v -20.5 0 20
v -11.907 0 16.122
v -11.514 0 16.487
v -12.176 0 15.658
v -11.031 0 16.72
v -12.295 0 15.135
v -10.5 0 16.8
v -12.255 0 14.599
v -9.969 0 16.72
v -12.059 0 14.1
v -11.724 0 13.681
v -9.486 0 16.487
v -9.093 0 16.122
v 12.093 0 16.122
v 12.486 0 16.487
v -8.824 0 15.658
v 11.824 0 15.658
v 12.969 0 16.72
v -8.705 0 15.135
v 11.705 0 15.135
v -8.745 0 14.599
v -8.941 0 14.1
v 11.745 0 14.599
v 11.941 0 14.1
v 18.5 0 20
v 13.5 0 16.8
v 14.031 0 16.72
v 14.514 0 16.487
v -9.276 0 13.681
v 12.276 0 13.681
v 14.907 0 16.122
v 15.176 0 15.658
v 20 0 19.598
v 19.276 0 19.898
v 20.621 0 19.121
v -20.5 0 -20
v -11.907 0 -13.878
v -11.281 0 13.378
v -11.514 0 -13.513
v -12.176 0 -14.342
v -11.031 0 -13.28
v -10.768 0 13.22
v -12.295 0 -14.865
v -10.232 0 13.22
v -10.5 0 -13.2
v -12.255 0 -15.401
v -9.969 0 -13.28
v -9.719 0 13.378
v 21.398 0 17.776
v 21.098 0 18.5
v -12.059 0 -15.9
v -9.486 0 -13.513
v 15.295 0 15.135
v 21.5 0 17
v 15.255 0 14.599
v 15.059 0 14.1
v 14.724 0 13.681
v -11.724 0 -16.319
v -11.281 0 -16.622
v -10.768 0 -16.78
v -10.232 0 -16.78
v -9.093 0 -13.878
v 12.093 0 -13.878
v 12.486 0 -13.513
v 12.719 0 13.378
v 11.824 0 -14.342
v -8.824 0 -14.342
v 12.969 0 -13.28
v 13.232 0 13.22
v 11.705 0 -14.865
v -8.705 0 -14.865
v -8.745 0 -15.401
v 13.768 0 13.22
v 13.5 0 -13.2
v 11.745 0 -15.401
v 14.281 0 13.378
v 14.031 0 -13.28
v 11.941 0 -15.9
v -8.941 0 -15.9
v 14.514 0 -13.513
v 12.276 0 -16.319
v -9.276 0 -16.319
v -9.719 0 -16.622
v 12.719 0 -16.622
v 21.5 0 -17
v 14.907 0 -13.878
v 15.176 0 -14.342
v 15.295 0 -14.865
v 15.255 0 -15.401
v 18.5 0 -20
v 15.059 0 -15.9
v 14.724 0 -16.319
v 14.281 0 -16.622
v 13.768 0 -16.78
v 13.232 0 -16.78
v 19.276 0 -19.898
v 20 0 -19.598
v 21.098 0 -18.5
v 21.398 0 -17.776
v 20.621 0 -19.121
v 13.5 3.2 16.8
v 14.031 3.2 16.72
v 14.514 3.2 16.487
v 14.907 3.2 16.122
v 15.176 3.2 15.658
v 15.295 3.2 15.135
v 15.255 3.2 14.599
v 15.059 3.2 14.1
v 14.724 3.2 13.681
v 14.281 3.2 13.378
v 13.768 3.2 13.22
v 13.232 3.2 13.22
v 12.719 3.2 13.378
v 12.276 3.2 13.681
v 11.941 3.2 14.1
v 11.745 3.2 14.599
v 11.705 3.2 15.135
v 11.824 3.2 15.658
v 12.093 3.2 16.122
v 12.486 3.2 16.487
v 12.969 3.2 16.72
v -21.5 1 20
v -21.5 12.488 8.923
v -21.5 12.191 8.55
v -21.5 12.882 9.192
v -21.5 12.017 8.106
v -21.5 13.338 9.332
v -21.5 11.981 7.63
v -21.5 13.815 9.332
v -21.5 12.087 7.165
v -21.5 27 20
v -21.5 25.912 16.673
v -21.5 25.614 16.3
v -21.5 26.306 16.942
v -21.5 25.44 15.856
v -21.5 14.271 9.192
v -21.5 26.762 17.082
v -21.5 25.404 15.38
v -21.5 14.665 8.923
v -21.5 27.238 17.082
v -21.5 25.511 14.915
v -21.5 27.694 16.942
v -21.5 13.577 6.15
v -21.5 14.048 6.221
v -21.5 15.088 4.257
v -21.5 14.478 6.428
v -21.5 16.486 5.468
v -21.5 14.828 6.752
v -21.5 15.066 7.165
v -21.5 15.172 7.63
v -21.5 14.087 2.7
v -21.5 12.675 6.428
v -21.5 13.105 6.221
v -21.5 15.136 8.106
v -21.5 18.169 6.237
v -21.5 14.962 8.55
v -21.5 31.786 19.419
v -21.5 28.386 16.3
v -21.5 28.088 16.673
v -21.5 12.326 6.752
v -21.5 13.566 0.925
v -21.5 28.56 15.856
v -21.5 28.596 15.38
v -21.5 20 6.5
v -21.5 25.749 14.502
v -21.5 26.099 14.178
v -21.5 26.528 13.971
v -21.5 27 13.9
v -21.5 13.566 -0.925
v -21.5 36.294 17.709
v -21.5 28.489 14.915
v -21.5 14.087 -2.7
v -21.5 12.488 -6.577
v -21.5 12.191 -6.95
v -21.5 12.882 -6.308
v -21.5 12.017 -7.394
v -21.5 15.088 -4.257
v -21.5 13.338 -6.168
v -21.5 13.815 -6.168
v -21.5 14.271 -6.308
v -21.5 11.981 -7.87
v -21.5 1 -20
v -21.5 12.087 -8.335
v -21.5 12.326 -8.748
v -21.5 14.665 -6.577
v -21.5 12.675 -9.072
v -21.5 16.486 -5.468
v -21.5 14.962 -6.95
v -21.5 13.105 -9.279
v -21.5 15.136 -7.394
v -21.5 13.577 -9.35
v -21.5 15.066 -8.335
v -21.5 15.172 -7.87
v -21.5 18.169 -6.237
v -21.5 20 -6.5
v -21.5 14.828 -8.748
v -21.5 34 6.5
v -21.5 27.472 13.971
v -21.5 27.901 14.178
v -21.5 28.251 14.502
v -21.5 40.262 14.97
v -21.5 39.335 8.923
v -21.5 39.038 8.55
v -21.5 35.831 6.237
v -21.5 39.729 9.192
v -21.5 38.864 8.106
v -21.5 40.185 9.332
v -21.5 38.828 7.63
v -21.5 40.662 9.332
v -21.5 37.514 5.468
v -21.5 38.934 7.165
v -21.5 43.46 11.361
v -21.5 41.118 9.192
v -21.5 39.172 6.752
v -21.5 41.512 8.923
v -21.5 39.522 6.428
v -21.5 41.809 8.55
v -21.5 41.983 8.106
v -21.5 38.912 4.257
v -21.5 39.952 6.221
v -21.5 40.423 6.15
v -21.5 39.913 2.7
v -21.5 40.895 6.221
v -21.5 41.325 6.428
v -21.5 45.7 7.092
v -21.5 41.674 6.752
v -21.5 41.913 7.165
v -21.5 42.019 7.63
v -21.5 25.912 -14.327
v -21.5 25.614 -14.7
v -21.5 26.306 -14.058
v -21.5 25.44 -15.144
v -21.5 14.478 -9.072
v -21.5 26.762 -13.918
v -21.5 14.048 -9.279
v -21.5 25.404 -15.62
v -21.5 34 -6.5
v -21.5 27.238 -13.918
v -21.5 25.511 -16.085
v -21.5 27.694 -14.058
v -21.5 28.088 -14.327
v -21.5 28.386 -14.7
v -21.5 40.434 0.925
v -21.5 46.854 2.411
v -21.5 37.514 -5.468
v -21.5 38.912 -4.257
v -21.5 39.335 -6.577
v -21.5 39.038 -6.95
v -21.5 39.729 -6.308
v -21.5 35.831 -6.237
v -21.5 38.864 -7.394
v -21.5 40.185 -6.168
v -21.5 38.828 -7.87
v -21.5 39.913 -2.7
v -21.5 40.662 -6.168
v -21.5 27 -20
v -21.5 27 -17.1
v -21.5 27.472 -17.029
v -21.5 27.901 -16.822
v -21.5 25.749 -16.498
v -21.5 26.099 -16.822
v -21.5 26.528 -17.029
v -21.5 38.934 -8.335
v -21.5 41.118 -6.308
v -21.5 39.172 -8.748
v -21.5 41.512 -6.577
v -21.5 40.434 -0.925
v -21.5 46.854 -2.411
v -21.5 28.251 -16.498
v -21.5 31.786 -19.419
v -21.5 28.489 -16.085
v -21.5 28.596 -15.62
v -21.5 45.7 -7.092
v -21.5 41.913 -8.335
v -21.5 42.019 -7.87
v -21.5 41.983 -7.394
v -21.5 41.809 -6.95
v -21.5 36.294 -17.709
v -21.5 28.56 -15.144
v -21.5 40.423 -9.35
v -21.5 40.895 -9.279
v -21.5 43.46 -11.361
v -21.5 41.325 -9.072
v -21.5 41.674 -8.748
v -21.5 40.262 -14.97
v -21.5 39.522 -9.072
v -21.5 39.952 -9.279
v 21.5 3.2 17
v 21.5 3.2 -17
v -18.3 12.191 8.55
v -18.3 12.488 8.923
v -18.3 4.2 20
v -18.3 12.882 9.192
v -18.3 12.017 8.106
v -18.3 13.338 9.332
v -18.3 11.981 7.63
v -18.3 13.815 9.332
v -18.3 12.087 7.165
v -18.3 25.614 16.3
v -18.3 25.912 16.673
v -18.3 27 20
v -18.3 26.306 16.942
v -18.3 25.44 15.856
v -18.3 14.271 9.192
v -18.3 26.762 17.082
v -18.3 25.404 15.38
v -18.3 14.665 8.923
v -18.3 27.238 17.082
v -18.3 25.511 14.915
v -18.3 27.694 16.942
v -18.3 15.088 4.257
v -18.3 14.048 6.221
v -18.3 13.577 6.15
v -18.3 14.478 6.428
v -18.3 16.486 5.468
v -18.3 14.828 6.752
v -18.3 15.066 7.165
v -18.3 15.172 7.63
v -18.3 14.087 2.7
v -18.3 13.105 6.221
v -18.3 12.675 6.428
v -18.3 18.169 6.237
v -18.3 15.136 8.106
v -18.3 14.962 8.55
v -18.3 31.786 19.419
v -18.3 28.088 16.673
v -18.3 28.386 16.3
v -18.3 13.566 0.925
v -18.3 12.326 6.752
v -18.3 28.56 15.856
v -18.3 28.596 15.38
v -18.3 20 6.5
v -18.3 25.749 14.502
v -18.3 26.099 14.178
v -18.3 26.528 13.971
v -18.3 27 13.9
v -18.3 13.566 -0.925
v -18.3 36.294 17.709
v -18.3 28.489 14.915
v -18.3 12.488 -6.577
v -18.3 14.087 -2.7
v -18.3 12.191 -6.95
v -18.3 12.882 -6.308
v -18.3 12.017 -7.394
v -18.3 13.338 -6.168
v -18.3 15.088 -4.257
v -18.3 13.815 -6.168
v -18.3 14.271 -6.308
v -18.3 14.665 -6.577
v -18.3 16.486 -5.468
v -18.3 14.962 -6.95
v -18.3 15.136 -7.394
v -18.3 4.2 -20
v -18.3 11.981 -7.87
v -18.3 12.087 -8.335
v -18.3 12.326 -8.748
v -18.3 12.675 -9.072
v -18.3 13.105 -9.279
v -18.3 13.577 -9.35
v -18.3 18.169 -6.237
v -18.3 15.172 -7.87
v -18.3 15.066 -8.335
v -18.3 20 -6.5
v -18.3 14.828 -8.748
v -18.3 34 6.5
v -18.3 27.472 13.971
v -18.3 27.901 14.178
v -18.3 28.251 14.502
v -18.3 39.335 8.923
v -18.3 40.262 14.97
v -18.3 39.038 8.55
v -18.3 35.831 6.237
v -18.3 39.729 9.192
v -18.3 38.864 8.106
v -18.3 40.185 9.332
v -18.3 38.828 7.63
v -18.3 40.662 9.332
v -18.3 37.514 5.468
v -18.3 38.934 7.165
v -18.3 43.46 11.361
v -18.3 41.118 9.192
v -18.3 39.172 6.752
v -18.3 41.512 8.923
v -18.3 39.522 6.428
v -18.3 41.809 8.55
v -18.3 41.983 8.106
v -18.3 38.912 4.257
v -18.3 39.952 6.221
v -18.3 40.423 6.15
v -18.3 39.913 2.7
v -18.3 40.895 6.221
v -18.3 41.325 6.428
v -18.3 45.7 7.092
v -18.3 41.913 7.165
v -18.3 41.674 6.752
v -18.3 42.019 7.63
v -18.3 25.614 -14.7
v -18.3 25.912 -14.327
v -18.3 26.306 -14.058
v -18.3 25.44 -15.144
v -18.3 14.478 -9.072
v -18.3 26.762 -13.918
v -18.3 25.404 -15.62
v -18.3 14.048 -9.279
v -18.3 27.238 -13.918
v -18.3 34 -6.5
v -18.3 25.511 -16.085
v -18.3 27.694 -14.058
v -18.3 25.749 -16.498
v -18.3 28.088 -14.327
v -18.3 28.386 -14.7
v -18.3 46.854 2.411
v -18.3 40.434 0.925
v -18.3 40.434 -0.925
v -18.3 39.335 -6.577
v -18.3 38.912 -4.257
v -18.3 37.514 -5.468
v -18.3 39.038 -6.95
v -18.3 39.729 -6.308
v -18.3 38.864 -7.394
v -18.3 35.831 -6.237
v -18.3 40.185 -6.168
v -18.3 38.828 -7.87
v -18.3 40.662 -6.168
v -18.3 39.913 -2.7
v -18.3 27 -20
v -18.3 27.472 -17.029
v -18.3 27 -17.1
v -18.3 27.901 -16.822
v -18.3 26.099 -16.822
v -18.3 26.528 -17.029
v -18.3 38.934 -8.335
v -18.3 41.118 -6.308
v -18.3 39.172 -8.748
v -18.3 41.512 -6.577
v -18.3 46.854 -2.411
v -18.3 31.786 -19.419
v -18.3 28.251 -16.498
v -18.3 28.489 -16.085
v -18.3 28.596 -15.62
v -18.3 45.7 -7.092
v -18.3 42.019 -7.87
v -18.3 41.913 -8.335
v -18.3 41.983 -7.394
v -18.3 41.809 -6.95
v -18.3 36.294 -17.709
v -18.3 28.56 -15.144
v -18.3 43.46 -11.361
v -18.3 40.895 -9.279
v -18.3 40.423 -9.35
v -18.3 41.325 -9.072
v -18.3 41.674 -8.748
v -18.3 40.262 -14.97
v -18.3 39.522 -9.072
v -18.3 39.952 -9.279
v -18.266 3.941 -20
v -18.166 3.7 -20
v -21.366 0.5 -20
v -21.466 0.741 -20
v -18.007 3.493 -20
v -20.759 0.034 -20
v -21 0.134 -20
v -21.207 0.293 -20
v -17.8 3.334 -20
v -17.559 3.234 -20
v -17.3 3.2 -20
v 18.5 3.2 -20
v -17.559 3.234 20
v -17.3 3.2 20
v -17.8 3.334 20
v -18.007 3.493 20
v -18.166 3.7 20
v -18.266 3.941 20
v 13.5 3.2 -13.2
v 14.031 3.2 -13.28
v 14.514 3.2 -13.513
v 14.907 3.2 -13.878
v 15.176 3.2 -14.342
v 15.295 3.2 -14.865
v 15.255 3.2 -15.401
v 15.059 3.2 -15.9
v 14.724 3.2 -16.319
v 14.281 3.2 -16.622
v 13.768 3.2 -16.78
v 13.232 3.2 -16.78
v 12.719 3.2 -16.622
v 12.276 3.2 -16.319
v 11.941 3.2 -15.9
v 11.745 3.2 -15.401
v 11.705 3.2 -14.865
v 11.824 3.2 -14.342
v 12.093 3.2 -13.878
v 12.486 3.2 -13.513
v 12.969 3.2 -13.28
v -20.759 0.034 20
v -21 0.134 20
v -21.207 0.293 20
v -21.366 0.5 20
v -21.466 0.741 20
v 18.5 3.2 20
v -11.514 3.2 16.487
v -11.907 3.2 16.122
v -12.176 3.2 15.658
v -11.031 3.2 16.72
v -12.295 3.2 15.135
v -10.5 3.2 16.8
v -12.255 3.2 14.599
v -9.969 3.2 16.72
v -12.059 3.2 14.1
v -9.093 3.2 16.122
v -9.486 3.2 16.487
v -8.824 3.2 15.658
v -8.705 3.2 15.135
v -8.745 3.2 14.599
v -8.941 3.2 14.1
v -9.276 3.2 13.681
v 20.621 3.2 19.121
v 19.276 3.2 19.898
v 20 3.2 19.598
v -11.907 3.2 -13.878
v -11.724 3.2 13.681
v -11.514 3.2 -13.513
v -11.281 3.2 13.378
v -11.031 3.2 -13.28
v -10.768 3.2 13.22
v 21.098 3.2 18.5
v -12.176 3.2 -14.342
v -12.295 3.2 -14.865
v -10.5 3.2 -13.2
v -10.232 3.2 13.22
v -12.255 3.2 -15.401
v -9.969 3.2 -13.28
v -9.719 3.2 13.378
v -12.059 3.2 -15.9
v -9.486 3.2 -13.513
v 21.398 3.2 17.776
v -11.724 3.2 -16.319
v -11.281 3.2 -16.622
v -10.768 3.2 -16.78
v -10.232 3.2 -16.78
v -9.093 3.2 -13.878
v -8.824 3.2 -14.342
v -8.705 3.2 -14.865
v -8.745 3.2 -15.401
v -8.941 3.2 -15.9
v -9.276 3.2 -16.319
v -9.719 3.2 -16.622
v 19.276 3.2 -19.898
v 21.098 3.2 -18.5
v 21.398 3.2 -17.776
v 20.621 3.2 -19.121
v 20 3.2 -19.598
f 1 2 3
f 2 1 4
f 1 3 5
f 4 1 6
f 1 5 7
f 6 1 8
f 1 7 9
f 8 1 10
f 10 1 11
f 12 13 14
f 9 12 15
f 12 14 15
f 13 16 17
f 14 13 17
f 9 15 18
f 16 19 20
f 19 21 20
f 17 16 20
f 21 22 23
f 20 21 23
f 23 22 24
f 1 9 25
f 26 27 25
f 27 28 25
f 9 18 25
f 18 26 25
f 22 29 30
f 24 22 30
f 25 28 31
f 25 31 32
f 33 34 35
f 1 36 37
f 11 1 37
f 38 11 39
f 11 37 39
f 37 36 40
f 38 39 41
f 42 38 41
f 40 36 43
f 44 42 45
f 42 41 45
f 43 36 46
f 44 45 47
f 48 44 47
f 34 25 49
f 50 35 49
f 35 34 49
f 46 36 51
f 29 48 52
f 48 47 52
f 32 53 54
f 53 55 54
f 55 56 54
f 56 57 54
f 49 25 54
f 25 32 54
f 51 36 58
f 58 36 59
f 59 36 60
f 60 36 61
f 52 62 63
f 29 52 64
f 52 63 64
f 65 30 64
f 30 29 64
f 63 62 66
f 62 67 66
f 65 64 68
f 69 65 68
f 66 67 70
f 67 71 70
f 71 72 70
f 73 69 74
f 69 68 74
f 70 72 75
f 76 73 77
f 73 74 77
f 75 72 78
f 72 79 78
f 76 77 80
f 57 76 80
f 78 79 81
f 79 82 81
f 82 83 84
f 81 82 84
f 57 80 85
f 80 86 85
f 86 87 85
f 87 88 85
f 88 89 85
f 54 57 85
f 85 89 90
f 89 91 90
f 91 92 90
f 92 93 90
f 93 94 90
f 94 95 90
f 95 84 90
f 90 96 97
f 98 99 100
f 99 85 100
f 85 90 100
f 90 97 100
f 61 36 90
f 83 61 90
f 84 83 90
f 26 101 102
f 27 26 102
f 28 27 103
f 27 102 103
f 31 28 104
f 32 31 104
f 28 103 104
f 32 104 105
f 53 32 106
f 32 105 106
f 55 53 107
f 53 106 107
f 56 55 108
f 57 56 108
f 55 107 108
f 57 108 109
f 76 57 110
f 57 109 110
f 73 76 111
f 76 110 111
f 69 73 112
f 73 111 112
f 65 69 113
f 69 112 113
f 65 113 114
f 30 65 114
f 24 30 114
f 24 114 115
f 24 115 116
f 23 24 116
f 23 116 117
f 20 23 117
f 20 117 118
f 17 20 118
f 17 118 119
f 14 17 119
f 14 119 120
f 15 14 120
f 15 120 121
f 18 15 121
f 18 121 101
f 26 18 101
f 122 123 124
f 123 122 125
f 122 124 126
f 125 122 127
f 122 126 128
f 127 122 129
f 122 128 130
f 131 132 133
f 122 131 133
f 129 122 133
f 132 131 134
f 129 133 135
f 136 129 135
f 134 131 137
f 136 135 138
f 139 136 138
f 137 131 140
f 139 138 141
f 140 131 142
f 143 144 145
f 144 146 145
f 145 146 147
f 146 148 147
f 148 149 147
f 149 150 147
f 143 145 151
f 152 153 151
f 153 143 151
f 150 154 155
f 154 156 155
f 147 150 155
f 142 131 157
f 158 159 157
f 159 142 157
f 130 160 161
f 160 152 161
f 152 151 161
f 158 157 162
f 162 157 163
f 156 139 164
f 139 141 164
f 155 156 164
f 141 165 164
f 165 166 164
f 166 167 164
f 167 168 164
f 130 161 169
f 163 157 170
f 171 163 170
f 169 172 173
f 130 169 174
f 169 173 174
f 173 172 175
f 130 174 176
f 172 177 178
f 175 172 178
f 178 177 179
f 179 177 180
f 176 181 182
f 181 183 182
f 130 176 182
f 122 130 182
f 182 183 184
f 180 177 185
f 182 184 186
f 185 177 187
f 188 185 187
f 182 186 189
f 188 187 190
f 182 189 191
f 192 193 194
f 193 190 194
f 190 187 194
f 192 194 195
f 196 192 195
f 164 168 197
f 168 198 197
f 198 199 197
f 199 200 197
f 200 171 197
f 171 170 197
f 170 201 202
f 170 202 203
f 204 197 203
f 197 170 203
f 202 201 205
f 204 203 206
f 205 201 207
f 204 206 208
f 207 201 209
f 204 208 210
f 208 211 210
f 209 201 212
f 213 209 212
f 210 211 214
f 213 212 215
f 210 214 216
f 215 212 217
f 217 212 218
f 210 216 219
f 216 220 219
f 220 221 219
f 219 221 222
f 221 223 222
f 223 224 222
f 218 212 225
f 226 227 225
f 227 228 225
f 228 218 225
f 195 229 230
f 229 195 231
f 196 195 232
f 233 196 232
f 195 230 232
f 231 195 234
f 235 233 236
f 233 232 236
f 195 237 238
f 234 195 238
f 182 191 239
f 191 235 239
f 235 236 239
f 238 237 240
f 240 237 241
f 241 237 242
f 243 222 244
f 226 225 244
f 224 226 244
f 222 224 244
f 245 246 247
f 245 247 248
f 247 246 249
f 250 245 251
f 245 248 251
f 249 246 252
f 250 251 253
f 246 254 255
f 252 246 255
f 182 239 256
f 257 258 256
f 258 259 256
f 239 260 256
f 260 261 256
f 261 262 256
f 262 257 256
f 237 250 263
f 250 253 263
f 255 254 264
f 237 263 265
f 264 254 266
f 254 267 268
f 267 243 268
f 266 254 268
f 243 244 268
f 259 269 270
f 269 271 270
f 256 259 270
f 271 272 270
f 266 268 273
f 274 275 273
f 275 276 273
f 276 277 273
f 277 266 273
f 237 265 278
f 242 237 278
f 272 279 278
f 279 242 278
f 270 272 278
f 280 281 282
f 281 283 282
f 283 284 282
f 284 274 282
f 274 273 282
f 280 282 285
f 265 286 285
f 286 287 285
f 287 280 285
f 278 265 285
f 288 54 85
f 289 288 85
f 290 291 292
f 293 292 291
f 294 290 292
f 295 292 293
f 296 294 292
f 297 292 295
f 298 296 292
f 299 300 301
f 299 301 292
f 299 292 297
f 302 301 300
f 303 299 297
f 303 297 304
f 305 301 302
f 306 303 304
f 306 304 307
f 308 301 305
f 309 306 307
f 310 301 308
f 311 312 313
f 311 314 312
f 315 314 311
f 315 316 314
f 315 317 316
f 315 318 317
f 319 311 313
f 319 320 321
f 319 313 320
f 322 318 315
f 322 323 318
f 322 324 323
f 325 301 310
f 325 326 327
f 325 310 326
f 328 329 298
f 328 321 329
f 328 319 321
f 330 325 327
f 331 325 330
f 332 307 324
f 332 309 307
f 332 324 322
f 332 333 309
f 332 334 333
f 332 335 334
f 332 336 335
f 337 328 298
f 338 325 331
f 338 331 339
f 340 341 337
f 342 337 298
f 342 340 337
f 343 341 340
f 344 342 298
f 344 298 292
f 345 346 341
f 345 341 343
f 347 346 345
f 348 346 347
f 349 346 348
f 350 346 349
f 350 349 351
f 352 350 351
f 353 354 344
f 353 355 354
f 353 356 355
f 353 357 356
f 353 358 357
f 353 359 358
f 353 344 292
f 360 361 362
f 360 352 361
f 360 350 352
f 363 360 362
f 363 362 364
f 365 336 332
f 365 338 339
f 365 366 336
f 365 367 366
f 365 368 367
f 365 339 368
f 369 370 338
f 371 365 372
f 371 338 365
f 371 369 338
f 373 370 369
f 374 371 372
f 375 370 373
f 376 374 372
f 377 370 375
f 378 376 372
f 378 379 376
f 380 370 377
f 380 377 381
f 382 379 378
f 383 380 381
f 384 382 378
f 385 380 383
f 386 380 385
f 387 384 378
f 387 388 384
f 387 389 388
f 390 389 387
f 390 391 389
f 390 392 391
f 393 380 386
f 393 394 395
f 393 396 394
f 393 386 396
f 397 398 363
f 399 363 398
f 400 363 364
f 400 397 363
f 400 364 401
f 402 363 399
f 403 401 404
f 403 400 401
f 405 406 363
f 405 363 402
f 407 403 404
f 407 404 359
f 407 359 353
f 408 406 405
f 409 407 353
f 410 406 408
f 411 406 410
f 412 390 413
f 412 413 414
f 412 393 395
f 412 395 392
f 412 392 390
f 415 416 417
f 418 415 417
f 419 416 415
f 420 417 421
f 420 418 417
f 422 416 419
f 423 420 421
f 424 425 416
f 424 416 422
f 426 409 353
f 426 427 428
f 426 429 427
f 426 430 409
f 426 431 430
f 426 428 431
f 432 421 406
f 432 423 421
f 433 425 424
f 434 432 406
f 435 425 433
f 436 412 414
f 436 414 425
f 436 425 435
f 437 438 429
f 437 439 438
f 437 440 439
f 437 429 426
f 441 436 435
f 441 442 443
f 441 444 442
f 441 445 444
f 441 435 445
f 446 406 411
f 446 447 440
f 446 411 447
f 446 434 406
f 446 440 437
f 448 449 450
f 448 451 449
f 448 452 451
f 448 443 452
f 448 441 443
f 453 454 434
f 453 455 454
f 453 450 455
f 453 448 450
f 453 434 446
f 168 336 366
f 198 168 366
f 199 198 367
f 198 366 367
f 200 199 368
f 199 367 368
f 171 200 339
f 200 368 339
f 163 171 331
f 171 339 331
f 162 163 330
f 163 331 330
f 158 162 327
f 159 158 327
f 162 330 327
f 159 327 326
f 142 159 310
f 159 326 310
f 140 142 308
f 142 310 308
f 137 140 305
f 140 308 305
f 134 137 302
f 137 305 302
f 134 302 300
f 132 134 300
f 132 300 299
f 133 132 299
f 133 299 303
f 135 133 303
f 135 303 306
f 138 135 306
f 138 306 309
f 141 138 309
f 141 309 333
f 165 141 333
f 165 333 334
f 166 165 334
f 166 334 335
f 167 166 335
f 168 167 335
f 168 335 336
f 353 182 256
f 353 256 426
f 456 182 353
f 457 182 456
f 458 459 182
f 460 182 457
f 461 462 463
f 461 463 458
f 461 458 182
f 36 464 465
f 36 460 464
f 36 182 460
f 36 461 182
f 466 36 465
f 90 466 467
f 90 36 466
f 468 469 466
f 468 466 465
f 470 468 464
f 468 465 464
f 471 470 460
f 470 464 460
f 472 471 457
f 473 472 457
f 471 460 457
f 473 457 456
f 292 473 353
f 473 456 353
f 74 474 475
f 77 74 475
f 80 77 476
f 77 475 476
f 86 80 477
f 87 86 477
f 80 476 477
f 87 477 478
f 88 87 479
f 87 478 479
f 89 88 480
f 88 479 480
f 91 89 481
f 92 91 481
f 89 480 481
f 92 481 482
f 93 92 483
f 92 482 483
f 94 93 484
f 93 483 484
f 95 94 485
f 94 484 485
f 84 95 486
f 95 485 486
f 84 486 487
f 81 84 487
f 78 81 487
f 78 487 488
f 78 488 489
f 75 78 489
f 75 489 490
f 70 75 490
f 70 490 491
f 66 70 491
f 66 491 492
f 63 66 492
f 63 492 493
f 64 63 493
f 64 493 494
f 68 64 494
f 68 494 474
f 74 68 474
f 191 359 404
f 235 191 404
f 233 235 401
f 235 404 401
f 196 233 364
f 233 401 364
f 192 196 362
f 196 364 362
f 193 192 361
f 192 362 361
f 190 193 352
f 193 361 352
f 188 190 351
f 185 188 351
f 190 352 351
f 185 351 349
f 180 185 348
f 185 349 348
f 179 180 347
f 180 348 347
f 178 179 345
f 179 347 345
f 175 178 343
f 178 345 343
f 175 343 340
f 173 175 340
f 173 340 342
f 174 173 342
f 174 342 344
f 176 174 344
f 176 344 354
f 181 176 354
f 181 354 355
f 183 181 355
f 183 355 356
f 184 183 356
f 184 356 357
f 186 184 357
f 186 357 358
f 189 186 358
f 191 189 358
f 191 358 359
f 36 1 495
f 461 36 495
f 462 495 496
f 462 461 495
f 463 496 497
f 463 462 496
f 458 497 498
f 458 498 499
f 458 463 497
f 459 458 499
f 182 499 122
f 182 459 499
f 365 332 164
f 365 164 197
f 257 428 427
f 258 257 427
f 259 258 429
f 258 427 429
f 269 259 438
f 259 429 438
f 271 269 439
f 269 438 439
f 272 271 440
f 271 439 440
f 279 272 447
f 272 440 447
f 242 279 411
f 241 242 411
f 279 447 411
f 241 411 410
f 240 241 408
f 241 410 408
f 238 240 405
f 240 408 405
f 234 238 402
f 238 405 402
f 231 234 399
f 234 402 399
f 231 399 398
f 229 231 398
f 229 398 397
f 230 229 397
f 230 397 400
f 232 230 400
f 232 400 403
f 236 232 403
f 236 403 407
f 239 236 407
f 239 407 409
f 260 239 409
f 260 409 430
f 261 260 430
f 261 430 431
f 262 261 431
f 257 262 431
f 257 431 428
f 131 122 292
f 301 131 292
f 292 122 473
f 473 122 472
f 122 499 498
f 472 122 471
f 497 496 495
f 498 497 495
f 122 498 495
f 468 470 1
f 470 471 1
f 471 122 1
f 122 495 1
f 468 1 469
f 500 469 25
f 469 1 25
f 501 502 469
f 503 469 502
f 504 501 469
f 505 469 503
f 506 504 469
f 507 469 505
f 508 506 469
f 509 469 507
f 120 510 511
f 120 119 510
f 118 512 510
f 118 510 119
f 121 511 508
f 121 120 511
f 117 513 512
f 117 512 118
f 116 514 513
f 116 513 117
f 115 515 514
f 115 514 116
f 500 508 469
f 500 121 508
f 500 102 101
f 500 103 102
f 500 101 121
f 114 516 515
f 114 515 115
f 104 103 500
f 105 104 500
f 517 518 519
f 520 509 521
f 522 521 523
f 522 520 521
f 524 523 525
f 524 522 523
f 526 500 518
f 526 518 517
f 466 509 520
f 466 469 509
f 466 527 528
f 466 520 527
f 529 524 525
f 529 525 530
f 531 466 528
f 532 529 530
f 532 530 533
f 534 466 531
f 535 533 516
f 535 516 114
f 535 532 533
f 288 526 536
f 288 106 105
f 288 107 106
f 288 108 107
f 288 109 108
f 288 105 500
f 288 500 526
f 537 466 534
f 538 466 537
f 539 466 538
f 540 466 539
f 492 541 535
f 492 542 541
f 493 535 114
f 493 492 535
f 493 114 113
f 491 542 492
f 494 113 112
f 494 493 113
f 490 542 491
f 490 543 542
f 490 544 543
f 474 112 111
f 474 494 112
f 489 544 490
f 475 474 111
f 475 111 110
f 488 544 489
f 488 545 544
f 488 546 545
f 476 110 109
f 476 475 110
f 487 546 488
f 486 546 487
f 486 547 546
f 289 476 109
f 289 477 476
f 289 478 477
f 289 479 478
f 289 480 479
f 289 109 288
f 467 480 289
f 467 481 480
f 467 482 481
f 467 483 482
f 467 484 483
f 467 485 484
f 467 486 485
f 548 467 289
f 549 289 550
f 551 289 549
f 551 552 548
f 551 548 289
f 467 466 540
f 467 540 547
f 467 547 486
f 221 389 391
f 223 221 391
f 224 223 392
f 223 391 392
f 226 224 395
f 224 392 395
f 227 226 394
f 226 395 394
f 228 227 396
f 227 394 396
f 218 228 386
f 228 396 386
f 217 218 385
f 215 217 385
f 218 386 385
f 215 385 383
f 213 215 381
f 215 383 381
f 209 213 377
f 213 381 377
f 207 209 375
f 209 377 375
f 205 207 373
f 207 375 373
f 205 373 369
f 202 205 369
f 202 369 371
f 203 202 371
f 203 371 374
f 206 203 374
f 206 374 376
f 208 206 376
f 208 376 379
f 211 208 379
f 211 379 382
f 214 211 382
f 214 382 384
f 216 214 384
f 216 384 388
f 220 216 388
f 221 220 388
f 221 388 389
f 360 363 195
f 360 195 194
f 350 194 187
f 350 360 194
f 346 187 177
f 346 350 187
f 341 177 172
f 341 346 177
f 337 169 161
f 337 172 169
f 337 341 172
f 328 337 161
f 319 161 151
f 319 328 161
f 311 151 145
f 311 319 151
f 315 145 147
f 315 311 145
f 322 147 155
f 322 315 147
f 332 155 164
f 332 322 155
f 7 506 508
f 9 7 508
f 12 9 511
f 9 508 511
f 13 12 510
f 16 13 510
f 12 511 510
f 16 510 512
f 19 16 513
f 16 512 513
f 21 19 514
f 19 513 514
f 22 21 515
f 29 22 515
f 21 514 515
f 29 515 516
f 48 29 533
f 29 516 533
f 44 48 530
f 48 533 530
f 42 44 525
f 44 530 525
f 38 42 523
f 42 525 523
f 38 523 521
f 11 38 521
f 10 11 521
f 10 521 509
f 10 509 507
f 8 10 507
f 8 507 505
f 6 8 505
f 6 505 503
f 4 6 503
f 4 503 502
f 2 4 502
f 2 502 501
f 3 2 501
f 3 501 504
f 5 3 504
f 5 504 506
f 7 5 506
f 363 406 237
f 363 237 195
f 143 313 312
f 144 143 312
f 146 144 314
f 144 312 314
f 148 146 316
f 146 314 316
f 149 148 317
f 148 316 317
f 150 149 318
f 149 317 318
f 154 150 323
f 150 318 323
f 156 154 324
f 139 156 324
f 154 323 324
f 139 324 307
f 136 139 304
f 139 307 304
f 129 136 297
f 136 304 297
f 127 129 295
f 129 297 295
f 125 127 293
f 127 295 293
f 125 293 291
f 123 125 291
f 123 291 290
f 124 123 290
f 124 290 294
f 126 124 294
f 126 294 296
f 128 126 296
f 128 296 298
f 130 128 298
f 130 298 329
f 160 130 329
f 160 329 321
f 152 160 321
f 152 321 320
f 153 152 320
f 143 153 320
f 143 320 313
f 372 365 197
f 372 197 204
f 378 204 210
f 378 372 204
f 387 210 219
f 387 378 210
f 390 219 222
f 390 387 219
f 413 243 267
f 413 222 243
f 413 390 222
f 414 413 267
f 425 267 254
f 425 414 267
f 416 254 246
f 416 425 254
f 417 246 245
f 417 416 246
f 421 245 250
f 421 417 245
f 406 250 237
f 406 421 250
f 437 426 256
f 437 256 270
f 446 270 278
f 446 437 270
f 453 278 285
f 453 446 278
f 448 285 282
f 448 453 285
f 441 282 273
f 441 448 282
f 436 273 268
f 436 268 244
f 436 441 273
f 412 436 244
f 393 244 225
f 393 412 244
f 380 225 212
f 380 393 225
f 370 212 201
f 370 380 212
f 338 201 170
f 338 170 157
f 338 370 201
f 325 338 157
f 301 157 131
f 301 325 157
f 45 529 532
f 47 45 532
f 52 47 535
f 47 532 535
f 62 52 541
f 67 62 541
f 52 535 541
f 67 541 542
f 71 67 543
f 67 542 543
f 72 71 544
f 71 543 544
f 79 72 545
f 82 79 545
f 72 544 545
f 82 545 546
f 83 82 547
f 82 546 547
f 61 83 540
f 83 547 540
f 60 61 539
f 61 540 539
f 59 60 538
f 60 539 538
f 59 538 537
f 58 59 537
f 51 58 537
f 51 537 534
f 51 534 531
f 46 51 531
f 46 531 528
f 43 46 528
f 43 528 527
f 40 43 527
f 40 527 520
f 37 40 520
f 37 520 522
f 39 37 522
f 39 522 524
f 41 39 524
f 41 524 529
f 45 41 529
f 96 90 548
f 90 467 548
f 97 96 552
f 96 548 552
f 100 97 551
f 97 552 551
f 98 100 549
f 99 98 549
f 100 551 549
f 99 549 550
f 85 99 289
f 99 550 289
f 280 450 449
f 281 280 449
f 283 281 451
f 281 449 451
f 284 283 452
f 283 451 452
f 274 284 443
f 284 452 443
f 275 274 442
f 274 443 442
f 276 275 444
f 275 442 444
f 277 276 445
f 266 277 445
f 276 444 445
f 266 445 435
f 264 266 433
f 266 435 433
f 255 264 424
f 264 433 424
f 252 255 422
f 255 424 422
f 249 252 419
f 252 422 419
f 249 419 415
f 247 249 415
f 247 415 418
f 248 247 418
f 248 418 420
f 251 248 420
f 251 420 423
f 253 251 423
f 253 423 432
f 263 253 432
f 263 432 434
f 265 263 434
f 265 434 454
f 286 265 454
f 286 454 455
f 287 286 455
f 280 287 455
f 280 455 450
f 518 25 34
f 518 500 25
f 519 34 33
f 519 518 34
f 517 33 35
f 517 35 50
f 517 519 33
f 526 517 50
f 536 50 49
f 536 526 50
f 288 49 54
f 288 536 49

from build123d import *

# Parameters (mm, degrees)
SKETCH_1_W          = 43
SKETCH_1_H          = 40
EXTRUDE_1_DEPTH     = 3.2
SKETCH_2_W          = 3.2
SKETCH_2_H          = 40
EXTRUDE_2_DEPTH     = 23.8
EXTRUDE_3_DEPTH     = 3.2
SKETCH_4_R          = 1.8
CUT_EXTRUDE_1_DEPTH = 53.732248198
FILLET_1_R          = 3
CUT_EXTRUDE_2_REACH = 66.754
SKETCH_5_R          = 1.6
FILLET_2_R          = 1


with BuildPart() as part:
    # 草图1 → 凸台-拉伸1 (new body)
    with BuildSketch(Plane(origin=(0, 0, 0), x_dir=(1, 0, 0), z_dir=(0, 1, 0))):
        Rectangle(SKETCH_1_W, SKETCH_1_H)
    extrude(amount=EXTRUDE_1_DEPTH)

    # 草图2 → 凸台-拉伸2 (add)
    with BuildSketch(Plane(origin=(0, 3.2, 0), x_dir=(1, 0, 0), z_dir=(0, 1, 0))):
        with Locations((-19.9, 0)):
            Rectangle(SKETCH_2_W, SKETCH_2_H)
    extrude(amount=EXTRUDE_2_DEPTH)

    # 草图3 → 凸台-拉伸3 (add)
    with BuildSketch(Plane(origin=(-18.3, 0, 0), x_dir=(0, 0, -1), z_dir=(1, 0, 0))):
        with BuildLine():
            Line((-20, 27), (20, 27))
            ThreePointArc((20, 27), (0, 47), (-20, 27))
        make_face()
    extrude(amount=-EXTRUDE_3_DEPTH)

    # 草图4 → 切除-拉伸1 (cut, through all)
    with BuildSketch(Plane(origin=(0, 3.2, 0), x_dir=(1, 0, 0), z_dir=(0, 1, 0))):
        with Locations(Location((13.5, 15, 0), (0, 0, 270))):
            Circle(SKETCH_4_R)
        with Locations(Location((-10.5, 15, 0), (0, 0, 270))):
            Circle(SKETCH_4_R)
        with Locations(Location((-10.5, -15, 0), (0, 0, 270))):
            Circle(SKETCH_4_R)
        with Locations(Location((13.5, -15, 0), (0, 0, 270))):
            Circle(SKETCH_4_R)
    extrude(amount=-CUT_EXTRUDE_1_DEPTH, mode=Mode.SUBTRACT)

    # 圆角1
    fillet_1_edges = [part.edges().sort_by_distance(p)[0] for p in [
        (21.5, 1.6, 20),
        (21.5, 1.6, -20),
    ]]
    fillet(fillet_1_edges, radius=FILLET_1_R)

    # 草图5 → 切除-拉伸2 (cut, up to next)
    with BuildSketch(Plane(origin=(-18.3, 0, 0), x_dir=(0, 0, -1), z_dir=(1, 0, 0)), mode=Mode.PRIVATE) as cut_extrude_2_sk1:
        with Locations((-7.75, 40.423393759)):
            Circle(SKETCH_5_R)
    cut_extrude_2_tool1 = extrude(cut_extrude_2_sk1.sketch, amount=-CUT_EXTRUDE_2_REACH, mode=Mode.PRIVATE) & part.part
    # 草图5 → 切除-拉伸2 (cut, up to next)
    with BuildSketch(Plane(origin=(-18.3, 0, 0), x_dir=(0, 0, -1), z_dir=(1, 0, 0)), mode=Mode.PRIVATE) as cut_extrude_2_sk2:
        with Locations((7.75, 40.423393759)):
            Circle(SKETCH_5_R)
    cut_extrude_2_tool2 = extrude(cut_extrude_2_sk2.sketch, amount=-CUT_EXTRUDE_2_REACH, mode=Mode.PRIVATE) & part.part
    # 草图5 → 切除-拉伸2 (cut, up to next)
    with BuildSketch(Plane(origin=(-18.3, 0, 0), x_dir=(0, 0, -1), z_dir=(1, 0, 0)), mode=Mode.PRIVATE) as cut_extrude_2_sk3:
        with Locations((15.5, 27)):
            Circle(SKETCH_5_R)
    cut_extrude_2_tool3 = extrude(cut_extrude_2_sk3.sketch, amount=-CUT_EXTRUDE_2_REACH, mode=Mode.PRIVATE) & part.part
    # 草图5 → 切除-拉伸2 (cut, up to next)
    with BuildSketch(Plane(origin=(-18.3, 0, 0), x_dir=(0, 0, -1), z_dir=(1, 0, 0)), mode=Mode.PRIVATE) as cut_extrude_2_sk4:
        with Locations((7.75, 13.576606241)):
            Circle(SKETCH_5_R)
    cut_extrude_2_tool4 = extrude(cut_extrude_2_sk4.sketch, amount=-CUT_EXTRUDE_2_REACH, mode=Mode.PRIVATE) & part.part
    # 草图5 → 切除-拉伸2 (cut, up to next)
    with BuildSketch(Plane(origin=(-18.3, 0, 0), x_dir=(0, 0, -1), z_dir=(1, 0, 0)), mode=Mode.PRIVATE) as cut_extrude_2_sk5:
        with Locations((-7.75, 13.576606241)):
            Circle(SKETCH_5_R)
    cut_extrude_2_tool5 = extrude(cut_extrude_2_sk5.sketch, amount=-CUT_EXTRUDE_2_REACH, mode=Mode.PRIVATE) & part.part
    # 草图5 → 切除-拉伸2 (cut, up to next)
    with BuildSketch(Plane(origin=(-18.3, 0, 0), x_dir=(0, 0, -1), z_dir=(1, 0, 0)), mode=Mode.PRIVATE) as cut_extrude_2_sk6:
        with Locations((-15.5, 27)):
            Circle(SKETCH_5_R)
    cut_extrude_2_tool6 = extrude(cut_extrude_2_sk6.sketch, amount=-CUT_EXTRUDE_2_REACH, mode=Mode.PRIVATE) & part.part
    # 草图5 → 切除-拉伸2 (cut, up to next)
    with BuildSketch(Plane(origin=(-18.3, 0, 0), x_dir=(0, 0, -1), z_dir=(1, 0, 0)), mode=Mode.PRIVATE) as cut_extrude_2_sk7:
        with BuildLine():
            Line((6.5, 34), (6.5, 20))
            ThreePointArc((6.5, 20), (0, 13.5), (-6.5, 20))
            Line((-6.5, 20), (-6.5, 34))
            ThreePointArc((-6.5, 34), (0, 40.5), (6.5, 34))
        make_face()
    cut_extrude_2_tool7 = extrude(cut_extrude_2_sk7.sketch, amount=-CUT_EXTRUDE_2_REACH, mode=Mode.PRIVATE) & part.part
    add(cut_extrude_2_tool1.solids().sort_by_distance((-18.3, 40.423394, 7.75))[0], mode=Mode.SUBTRACT)
    add(cut_extrude_2_tool2.solids().sort_by_distance((-18.3, 40.423394, -7.75))[0], mode=Mode.SUBTRACT)
    add(cut_extrude_2_tool3.solids().sort_by_distance((-18.3, 27, -15.5))[0], mode=Mode.SUBTRACT)
    add(cut_extrude_2_tool4.solids().sort_by_distance((-18.3, 13.576606, -7.75))[0], mode=Mode.SUBTRACT)
    add(cut_extrude_2_tool5.solids().sort_by_distance((-18.3, 13.576606, 7.75))[0], mode=Mode.SUBTRACT)
    add(cut_extrude_2_tool6.solids().sort_by_distance((-18.3, 27, 15.5))[0], mode=Mode.SUBTRACT)
    add(cut_extrude_2_tool7.solids().sort_by_distance((-18.3, 27, 0))[0], mode=Mode.SUBTRACT)

    # 圆角2
    fillet_2_edges = [part.edges().sort_by_distance(p)[0] for p in [
        (-18.3, 3.2, 0),
        (-21.5, 0, 0),
    ]]
    fillet(fillet_2_edges, radius=FILLET_2_R)


solid = part.part
